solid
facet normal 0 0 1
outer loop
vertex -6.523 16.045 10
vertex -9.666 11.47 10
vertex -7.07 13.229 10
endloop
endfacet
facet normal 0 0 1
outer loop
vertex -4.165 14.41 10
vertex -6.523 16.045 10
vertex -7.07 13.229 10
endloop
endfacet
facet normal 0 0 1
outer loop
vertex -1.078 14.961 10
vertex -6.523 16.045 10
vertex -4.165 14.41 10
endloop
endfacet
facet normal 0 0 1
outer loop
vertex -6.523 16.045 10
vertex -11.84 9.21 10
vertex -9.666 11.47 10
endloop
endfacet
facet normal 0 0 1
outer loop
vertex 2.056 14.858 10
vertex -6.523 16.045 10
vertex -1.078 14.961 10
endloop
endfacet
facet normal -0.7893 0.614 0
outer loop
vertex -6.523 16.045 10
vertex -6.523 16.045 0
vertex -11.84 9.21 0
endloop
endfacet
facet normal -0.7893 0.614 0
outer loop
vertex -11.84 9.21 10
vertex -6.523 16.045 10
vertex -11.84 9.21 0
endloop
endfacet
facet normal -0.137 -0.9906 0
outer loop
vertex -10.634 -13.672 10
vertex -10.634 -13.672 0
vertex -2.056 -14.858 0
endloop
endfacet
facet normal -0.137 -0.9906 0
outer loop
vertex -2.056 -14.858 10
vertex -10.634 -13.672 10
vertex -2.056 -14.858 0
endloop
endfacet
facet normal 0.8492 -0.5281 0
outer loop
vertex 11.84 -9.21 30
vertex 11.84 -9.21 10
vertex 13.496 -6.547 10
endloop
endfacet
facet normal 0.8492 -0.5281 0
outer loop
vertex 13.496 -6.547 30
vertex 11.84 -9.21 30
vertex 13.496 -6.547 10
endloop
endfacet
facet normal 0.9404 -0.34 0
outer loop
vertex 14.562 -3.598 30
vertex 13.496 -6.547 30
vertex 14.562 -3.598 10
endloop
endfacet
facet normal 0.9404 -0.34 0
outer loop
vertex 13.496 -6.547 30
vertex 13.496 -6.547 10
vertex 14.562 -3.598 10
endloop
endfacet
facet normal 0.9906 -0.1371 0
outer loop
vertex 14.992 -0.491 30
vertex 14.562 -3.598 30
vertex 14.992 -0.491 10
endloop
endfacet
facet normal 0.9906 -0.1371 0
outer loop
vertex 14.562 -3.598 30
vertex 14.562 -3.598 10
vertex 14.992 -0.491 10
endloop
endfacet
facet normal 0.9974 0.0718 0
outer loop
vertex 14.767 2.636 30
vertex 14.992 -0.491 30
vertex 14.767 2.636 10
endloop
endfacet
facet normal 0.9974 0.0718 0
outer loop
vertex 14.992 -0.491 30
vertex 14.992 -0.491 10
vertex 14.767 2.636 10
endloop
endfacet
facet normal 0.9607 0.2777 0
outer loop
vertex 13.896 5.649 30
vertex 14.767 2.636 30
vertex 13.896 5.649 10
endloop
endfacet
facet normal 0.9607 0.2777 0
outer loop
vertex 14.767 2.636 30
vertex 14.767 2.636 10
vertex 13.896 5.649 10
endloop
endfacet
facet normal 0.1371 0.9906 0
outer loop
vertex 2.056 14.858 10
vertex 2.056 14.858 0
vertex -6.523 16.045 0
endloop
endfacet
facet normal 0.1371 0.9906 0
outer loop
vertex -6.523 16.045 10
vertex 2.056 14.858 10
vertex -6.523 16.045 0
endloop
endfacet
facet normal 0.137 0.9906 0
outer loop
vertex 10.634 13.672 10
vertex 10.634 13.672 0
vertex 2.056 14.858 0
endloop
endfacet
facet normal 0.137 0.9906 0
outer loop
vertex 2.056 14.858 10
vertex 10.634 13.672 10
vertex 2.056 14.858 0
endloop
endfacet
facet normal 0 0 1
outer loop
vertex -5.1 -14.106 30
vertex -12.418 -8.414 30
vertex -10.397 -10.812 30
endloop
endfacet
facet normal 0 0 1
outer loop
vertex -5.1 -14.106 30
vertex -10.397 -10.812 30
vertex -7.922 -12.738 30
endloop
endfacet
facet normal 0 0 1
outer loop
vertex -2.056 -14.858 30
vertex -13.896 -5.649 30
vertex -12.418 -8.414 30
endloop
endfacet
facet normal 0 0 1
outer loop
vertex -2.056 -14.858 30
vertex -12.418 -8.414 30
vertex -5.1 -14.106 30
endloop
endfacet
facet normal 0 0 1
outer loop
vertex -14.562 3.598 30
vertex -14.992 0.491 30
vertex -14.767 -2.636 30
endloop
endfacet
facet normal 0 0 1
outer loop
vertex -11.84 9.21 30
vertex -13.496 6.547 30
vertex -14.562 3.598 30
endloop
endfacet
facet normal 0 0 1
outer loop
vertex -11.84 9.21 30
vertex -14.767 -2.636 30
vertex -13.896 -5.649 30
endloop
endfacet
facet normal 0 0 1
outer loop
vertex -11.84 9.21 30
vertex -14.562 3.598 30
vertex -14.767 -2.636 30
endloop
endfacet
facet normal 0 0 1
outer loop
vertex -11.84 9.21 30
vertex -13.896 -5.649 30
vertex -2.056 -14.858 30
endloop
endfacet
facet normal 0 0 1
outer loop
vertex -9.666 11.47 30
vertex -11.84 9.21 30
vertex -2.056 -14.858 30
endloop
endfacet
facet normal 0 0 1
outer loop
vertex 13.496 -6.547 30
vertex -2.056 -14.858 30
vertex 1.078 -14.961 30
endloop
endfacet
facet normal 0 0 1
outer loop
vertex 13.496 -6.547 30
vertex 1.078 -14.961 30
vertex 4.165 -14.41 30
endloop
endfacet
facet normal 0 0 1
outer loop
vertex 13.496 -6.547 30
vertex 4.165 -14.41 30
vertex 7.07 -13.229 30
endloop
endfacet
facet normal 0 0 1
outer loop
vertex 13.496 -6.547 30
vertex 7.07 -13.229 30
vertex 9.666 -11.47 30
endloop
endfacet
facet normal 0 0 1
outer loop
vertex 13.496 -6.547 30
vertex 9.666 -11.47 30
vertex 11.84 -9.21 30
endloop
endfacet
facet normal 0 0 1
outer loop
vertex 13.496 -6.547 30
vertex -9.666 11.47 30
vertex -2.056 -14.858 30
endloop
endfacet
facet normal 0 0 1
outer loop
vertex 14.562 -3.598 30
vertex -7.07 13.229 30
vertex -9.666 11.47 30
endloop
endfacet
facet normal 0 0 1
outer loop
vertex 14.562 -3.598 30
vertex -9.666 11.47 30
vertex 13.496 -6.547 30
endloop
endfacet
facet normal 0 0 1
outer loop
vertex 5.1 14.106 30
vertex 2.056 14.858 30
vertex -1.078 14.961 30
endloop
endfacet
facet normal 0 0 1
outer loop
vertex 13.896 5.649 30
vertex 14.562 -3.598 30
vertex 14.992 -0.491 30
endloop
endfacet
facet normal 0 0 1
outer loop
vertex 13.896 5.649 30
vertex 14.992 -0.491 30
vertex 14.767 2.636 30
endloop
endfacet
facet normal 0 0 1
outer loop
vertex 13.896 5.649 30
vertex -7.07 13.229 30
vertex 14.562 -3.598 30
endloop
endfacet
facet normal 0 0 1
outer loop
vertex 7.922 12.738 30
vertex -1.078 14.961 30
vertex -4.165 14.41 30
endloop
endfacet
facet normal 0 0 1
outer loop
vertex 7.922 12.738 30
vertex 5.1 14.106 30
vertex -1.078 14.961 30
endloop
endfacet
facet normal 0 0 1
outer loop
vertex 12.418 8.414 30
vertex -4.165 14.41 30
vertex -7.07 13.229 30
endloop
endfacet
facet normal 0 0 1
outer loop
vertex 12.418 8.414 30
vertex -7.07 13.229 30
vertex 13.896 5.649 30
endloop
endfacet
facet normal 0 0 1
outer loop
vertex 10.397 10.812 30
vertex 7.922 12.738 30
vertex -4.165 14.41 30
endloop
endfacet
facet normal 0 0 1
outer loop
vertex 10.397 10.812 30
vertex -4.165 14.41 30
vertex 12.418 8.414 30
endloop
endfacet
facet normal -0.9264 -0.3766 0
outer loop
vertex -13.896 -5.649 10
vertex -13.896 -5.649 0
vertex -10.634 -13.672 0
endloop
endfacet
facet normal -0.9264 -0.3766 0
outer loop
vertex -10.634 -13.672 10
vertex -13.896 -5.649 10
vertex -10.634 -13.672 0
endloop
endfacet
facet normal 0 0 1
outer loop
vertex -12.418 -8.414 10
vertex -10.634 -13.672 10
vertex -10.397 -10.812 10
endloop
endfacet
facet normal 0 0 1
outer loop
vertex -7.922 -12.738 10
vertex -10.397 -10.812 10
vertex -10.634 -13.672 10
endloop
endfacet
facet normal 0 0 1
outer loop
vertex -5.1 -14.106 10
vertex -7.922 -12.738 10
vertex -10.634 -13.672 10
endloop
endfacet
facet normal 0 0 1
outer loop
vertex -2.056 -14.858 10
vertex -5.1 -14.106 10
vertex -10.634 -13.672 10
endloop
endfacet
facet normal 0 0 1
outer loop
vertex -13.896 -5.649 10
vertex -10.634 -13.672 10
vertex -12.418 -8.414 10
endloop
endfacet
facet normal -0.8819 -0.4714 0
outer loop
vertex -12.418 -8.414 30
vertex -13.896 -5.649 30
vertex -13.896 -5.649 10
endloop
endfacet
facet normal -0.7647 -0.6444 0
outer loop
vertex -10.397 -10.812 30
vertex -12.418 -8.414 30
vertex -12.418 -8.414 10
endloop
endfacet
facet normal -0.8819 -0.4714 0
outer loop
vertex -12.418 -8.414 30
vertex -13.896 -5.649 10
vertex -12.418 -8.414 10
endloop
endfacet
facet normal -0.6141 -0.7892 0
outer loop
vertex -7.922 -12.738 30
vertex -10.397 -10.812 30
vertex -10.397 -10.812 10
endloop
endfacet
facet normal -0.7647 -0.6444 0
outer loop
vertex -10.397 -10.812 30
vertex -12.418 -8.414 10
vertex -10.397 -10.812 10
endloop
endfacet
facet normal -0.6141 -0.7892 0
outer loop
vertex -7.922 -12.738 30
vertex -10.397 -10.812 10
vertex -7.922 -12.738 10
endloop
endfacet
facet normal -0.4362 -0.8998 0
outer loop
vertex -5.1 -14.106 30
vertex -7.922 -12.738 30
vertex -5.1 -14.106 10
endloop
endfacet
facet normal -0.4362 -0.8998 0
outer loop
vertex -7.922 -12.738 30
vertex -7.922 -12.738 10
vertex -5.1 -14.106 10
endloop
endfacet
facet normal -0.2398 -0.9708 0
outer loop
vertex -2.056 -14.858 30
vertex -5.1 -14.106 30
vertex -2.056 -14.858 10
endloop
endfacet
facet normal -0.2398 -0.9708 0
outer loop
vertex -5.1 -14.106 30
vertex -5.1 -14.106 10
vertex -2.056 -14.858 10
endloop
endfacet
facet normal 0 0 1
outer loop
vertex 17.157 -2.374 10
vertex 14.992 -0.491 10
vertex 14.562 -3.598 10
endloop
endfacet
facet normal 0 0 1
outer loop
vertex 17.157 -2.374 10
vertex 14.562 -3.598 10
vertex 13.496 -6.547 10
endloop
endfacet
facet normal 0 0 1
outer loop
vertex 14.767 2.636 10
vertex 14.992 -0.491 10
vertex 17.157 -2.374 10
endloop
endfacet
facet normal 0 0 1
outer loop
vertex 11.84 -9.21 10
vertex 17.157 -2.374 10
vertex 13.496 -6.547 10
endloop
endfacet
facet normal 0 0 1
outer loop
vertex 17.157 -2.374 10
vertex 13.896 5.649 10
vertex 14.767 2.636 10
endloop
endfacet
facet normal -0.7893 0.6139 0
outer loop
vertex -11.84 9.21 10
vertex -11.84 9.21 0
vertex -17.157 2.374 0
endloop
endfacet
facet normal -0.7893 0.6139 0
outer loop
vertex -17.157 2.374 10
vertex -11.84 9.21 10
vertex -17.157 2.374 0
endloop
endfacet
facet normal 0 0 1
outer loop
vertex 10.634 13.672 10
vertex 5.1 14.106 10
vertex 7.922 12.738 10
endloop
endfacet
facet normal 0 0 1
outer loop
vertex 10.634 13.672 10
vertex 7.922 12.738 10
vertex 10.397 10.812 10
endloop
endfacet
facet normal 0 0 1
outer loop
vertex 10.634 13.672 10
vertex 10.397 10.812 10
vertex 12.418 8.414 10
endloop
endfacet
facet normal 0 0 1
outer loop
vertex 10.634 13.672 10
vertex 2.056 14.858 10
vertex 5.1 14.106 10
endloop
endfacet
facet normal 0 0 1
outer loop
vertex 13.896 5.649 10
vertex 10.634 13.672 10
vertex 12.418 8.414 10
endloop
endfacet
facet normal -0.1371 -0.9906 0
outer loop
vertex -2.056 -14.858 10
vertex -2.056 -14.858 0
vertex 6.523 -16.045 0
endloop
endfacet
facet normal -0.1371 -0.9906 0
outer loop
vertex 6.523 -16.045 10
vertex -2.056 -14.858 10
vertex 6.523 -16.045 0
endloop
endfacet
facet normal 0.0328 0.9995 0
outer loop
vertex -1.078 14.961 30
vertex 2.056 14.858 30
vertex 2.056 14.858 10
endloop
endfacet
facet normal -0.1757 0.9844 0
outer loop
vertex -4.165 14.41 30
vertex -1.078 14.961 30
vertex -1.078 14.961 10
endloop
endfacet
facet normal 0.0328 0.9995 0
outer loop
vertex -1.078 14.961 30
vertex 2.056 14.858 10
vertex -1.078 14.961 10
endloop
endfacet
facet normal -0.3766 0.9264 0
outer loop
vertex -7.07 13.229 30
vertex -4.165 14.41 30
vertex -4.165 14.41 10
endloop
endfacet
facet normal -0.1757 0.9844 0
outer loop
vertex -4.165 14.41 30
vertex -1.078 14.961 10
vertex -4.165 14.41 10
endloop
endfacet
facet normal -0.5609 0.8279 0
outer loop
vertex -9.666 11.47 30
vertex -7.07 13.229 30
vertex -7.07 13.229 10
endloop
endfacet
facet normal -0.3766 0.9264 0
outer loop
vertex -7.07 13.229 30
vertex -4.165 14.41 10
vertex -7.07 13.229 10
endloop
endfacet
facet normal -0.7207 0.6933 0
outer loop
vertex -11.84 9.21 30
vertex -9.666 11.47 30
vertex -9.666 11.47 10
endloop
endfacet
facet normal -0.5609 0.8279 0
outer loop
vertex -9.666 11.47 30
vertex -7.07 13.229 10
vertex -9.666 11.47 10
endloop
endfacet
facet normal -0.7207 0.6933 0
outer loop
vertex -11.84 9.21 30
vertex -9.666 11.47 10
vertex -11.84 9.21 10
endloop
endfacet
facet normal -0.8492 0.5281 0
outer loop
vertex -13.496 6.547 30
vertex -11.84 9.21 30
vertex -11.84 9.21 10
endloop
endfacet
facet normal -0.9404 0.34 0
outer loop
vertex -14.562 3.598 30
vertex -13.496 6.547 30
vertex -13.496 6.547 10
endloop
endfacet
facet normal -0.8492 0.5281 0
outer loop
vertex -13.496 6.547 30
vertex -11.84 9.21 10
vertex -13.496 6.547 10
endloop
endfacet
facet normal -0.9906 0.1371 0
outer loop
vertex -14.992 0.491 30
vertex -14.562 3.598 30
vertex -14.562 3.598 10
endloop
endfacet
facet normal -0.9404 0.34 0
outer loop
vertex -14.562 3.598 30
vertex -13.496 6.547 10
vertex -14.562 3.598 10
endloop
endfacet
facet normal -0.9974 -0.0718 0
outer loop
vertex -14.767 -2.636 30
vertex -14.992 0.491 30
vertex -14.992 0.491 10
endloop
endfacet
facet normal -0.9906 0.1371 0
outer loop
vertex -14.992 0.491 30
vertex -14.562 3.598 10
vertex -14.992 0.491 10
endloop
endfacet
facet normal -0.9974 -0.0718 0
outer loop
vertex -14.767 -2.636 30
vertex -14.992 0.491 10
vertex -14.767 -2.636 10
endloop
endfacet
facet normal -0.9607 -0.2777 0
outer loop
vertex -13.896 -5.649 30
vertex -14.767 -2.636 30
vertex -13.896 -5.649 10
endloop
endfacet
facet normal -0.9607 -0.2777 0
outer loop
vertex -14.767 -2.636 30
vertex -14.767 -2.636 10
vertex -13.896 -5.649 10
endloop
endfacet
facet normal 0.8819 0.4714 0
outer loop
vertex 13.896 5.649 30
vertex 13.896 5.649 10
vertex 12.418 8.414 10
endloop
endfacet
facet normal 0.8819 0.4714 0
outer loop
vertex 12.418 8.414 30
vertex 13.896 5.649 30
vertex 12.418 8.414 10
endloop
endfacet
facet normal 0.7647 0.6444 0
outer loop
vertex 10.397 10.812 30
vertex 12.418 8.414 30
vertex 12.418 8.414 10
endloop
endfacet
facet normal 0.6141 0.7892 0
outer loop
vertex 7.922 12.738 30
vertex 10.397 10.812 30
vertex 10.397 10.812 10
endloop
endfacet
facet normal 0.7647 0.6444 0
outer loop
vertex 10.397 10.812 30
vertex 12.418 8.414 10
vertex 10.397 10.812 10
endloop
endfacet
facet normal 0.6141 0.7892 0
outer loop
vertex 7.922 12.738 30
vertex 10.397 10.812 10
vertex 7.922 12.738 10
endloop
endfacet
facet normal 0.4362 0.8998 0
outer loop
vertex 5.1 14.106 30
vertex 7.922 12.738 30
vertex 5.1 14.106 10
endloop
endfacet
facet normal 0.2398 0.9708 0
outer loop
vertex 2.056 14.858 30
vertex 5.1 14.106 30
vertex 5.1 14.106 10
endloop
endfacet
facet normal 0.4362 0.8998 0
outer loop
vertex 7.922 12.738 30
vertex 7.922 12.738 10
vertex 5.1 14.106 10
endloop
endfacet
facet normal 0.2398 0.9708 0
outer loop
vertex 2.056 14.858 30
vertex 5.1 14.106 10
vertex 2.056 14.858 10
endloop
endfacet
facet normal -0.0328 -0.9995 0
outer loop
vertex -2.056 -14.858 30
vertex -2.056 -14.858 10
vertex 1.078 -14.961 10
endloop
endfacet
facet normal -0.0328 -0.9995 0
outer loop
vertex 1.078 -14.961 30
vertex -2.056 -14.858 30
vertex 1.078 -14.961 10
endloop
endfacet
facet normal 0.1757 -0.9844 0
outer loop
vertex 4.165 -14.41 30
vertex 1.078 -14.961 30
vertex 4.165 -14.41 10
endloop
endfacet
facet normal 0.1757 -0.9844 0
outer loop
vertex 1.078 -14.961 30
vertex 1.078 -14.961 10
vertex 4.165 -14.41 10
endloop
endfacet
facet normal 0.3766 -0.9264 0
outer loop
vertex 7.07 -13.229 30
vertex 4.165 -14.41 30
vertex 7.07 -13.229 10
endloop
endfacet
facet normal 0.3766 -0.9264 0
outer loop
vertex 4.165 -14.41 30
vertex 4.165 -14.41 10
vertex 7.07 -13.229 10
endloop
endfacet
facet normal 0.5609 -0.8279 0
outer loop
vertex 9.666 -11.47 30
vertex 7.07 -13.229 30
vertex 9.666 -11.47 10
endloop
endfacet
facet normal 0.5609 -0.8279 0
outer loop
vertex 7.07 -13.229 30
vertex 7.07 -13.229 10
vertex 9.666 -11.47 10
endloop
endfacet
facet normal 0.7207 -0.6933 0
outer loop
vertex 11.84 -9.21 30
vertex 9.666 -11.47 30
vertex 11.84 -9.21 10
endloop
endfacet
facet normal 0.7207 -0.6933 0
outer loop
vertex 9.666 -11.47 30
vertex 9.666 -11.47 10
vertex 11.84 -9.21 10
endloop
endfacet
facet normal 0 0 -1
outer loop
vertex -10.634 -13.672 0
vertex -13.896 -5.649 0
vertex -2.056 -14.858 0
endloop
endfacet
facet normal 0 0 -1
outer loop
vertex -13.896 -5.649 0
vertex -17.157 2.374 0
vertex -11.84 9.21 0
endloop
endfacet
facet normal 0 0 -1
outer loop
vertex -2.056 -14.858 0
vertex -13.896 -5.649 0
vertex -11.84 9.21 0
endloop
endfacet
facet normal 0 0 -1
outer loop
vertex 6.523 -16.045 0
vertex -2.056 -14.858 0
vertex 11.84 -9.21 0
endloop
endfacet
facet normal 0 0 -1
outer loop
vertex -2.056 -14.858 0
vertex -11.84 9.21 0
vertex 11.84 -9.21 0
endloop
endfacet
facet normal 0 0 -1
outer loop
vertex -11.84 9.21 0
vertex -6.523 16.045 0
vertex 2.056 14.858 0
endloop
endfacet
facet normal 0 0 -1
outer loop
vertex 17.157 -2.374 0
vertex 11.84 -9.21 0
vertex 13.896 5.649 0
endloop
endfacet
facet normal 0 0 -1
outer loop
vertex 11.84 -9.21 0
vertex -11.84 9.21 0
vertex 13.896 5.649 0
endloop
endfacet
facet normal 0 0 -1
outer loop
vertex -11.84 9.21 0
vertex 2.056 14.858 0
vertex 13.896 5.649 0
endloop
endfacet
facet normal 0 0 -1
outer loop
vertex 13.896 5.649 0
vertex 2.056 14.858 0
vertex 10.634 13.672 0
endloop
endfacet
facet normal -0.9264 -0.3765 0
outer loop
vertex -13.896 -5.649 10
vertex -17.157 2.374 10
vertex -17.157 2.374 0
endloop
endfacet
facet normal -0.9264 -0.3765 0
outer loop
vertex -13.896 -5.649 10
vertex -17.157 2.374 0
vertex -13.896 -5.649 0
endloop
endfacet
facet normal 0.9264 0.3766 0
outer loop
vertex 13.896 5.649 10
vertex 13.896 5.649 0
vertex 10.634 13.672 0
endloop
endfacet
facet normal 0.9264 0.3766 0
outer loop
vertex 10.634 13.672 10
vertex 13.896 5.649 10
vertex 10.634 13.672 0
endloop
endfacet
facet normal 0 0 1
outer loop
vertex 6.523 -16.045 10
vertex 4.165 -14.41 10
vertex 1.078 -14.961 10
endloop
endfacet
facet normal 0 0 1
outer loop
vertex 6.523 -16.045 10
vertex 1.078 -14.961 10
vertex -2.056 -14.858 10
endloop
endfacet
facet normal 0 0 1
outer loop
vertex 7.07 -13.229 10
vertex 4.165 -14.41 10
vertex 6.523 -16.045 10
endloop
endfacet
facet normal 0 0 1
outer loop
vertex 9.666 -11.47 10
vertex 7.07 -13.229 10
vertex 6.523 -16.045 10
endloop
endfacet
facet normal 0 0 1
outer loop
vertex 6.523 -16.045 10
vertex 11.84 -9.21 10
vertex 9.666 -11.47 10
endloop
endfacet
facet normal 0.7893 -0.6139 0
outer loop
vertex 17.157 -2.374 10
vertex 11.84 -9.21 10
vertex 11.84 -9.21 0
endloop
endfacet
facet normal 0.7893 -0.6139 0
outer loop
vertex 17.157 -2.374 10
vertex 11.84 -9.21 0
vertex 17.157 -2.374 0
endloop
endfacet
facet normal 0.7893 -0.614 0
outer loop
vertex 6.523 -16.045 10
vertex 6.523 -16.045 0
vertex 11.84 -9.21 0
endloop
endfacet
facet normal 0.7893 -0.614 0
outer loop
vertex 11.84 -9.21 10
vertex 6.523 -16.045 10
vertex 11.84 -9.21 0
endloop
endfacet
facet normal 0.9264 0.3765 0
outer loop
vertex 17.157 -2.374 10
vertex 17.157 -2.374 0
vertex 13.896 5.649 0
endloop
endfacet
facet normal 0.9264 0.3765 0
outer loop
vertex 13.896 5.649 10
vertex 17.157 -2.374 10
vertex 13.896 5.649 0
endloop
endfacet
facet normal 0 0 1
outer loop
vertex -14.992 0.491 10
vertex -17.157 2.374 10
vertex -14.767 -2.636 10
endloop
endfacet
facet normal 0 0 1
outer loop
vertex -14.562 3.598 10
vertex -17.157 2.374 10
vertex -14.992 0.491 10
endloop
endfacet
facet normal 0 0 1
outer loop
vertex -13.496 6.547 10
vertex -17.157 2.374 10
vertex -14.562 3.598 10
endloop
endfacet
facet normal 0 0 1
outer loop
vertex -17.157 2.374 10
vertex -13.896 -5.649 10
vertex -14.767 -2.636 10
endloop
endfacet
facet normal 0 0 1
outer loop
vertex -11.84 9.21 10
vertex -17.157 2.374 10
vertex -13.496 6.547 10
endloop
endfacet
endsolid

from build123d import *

# Parameters (mm, degrees)
F1_DEPTH = 50
F2_DEPTH = 10
F3_DEPTH = 20


with BuildPart() as f1:
    # F0 (on Top) → F1 (new body)
    with BuildSketch(Plane.XY):
        with BuildLine():
            ThreePointArc((11.839883195, -9.2096235498), (14.1879922456, -4.8683545514), (15, 0))
            ThreePointArc((15, 0), (14.7213389809, 2.8778774487), (13.8957095187, 5.648827929))
            ThreePointArc((13.8957095187, 5.648827929), (9.2096233049, 11.8398833855), (2.0558258258, 14.858451473))
            ThreePointArc((2.0558258258, 14.858451473), (-5.6488280861, 13.8957094548), (-11.8398831796, 9.2096235695))
            ThreePointArc((-11.8398831796, 9.2096235695), (-14.8584514186, 2.0558262189), (-13.8957094373, -5.6488281293))
            ThreePointArc((-13.8957094373, -5.6488281293), (-9.2096232871, -11.8398833994), (-2.0558259954, -14.8584514495))
            ThreePointArc((-2.0558259954, -14.8584514495), (5.6488280184, -13.8957094824), (11.839883195, -9.2096235498))
        make_face()
    extrude(amount=F1_DEPTH)

    # F0 (on Top) → F2 (join)
    with BuildSketch(Plane.XY):
        with BuildLine():
            ThreePointArc((11.839883195, -9.2096235498), (14.1879922456, -4.8683545514), (15, 0))
            ThreePointArc((15, 0), (14.7213389809, 2.8778774487), (13.8957095187, 5.648827929))
            ThreePointArc((13.8957095187, 5.648827929), (9.2096233049, 11.8398833855), (2.0558258258, 14.858451473))
            ThreePointArc((2.0558258258, 14.858451473), (-5.6488280861, 13.8957094548), (-11.8398831796, 9.2096235695))
            ThreePointArc((-11.8398831796, 9.2096235695), (-14.8584514186, 2.0558262189), (-13.8957094373, -5.6488281293))
            ThreePointArc((-13.8957094373, -5.6488281293), (-9.2096232871, -11.8398833994), (-2.0558259954, -14.8584514495))
            ThreePointArc((-2.0558259954, -14.8584514495), (5.6488280184, -13.8957094824), (11.839883195, -9.2096235498))
        make_face()
        with BuildLine():
            ThreePointArc((13.8957095187, 5.648827929), (14.7213389809, 2.8778774487), (15, 0))
            ThreePointArc((15, 0), (14.1879922456, -4.8683545514), (11.839883195, -9.2096235498))
            Line((11.839883195, -9.2096235498), (17.1570618896, -2.3738633739))
            Line((17.1570618896, -2.3738633739), (13.8957095187, 5.648827929))
        make_face()
        with BuildLine():
            ThreePointArc((2.0558258258, 14.858451473), (9.2096233049, 11.8398833855), (13.8957095187, 5.648827929))
            Line((13.8957095187, 5.648827929), (10.6343569317, 13.6715197637))
            Line((10.6343569317, 13.6715197637), (2.0558258258, 14.858451473))
        make_face()
        with BuildLine():
            Line((6.5227049579, -16.0453831376), (11.839883195, -9.2096235498))
            ThreePointArc((11.839883195, -9.2096235498), (5.6488280184, -13.8957094824), (-2.0558259954, -14.8584514495))
            Line((-2.0558259954, -14.8584514495), (6.5227049579, -16.0453831376))
        make_face()
        with BuildLine():
            ThreePointArc((-11.8398831796, 9.2096235695), (-5.6488280861, 13.8957094548), (2.0558258258, 14.858451473))
            Line((2.0558258258, 14.858451473), (-6.5227049579, 16.0453831376))
            Line((-6.5227049579, 16.0453831376), (-11.8398831796, 9.2096235695))
        make_face()
        with BuildLine():
            Line((-10.6343569317, -13.6715197637), (-2.0558259954, -14.8584514495))
            ThreePointArc((-2.0558259954, -14.8584514495), (-9.2096232871, -11.8398833994), (-13.8957094373, -5.6488281293))
            Line((-13.8957094373, -5.6488281293), (-10.6343569317, -13.6715197637))
        make_face()
        with BuildLine():
            ThreePointArc((-13.8957094373, -5.6488281293), (-14.8584514186, 2.0558262189), (-11.8398831796, 9.2096235695))
            Line((-11.8398831796, 9.2096235695), (-17.1570618896, 2.3738633739))
            Line((-17.1570618896, 2.3738633739), (-13.8957094373, -5.6488281293))
        make_face()
    extrude(amount=F2_DEPTH)

    # F3 (cut): a face of the model
    f3_faces = [f1.faces().sort_by_distance(p)[0] for p in [
        (0, 0, 50),
    ]]
    extrude(f3_faces, amount=-F3_DEPTH, mode=Mode.SUBTRACT)


solid = f1.part
